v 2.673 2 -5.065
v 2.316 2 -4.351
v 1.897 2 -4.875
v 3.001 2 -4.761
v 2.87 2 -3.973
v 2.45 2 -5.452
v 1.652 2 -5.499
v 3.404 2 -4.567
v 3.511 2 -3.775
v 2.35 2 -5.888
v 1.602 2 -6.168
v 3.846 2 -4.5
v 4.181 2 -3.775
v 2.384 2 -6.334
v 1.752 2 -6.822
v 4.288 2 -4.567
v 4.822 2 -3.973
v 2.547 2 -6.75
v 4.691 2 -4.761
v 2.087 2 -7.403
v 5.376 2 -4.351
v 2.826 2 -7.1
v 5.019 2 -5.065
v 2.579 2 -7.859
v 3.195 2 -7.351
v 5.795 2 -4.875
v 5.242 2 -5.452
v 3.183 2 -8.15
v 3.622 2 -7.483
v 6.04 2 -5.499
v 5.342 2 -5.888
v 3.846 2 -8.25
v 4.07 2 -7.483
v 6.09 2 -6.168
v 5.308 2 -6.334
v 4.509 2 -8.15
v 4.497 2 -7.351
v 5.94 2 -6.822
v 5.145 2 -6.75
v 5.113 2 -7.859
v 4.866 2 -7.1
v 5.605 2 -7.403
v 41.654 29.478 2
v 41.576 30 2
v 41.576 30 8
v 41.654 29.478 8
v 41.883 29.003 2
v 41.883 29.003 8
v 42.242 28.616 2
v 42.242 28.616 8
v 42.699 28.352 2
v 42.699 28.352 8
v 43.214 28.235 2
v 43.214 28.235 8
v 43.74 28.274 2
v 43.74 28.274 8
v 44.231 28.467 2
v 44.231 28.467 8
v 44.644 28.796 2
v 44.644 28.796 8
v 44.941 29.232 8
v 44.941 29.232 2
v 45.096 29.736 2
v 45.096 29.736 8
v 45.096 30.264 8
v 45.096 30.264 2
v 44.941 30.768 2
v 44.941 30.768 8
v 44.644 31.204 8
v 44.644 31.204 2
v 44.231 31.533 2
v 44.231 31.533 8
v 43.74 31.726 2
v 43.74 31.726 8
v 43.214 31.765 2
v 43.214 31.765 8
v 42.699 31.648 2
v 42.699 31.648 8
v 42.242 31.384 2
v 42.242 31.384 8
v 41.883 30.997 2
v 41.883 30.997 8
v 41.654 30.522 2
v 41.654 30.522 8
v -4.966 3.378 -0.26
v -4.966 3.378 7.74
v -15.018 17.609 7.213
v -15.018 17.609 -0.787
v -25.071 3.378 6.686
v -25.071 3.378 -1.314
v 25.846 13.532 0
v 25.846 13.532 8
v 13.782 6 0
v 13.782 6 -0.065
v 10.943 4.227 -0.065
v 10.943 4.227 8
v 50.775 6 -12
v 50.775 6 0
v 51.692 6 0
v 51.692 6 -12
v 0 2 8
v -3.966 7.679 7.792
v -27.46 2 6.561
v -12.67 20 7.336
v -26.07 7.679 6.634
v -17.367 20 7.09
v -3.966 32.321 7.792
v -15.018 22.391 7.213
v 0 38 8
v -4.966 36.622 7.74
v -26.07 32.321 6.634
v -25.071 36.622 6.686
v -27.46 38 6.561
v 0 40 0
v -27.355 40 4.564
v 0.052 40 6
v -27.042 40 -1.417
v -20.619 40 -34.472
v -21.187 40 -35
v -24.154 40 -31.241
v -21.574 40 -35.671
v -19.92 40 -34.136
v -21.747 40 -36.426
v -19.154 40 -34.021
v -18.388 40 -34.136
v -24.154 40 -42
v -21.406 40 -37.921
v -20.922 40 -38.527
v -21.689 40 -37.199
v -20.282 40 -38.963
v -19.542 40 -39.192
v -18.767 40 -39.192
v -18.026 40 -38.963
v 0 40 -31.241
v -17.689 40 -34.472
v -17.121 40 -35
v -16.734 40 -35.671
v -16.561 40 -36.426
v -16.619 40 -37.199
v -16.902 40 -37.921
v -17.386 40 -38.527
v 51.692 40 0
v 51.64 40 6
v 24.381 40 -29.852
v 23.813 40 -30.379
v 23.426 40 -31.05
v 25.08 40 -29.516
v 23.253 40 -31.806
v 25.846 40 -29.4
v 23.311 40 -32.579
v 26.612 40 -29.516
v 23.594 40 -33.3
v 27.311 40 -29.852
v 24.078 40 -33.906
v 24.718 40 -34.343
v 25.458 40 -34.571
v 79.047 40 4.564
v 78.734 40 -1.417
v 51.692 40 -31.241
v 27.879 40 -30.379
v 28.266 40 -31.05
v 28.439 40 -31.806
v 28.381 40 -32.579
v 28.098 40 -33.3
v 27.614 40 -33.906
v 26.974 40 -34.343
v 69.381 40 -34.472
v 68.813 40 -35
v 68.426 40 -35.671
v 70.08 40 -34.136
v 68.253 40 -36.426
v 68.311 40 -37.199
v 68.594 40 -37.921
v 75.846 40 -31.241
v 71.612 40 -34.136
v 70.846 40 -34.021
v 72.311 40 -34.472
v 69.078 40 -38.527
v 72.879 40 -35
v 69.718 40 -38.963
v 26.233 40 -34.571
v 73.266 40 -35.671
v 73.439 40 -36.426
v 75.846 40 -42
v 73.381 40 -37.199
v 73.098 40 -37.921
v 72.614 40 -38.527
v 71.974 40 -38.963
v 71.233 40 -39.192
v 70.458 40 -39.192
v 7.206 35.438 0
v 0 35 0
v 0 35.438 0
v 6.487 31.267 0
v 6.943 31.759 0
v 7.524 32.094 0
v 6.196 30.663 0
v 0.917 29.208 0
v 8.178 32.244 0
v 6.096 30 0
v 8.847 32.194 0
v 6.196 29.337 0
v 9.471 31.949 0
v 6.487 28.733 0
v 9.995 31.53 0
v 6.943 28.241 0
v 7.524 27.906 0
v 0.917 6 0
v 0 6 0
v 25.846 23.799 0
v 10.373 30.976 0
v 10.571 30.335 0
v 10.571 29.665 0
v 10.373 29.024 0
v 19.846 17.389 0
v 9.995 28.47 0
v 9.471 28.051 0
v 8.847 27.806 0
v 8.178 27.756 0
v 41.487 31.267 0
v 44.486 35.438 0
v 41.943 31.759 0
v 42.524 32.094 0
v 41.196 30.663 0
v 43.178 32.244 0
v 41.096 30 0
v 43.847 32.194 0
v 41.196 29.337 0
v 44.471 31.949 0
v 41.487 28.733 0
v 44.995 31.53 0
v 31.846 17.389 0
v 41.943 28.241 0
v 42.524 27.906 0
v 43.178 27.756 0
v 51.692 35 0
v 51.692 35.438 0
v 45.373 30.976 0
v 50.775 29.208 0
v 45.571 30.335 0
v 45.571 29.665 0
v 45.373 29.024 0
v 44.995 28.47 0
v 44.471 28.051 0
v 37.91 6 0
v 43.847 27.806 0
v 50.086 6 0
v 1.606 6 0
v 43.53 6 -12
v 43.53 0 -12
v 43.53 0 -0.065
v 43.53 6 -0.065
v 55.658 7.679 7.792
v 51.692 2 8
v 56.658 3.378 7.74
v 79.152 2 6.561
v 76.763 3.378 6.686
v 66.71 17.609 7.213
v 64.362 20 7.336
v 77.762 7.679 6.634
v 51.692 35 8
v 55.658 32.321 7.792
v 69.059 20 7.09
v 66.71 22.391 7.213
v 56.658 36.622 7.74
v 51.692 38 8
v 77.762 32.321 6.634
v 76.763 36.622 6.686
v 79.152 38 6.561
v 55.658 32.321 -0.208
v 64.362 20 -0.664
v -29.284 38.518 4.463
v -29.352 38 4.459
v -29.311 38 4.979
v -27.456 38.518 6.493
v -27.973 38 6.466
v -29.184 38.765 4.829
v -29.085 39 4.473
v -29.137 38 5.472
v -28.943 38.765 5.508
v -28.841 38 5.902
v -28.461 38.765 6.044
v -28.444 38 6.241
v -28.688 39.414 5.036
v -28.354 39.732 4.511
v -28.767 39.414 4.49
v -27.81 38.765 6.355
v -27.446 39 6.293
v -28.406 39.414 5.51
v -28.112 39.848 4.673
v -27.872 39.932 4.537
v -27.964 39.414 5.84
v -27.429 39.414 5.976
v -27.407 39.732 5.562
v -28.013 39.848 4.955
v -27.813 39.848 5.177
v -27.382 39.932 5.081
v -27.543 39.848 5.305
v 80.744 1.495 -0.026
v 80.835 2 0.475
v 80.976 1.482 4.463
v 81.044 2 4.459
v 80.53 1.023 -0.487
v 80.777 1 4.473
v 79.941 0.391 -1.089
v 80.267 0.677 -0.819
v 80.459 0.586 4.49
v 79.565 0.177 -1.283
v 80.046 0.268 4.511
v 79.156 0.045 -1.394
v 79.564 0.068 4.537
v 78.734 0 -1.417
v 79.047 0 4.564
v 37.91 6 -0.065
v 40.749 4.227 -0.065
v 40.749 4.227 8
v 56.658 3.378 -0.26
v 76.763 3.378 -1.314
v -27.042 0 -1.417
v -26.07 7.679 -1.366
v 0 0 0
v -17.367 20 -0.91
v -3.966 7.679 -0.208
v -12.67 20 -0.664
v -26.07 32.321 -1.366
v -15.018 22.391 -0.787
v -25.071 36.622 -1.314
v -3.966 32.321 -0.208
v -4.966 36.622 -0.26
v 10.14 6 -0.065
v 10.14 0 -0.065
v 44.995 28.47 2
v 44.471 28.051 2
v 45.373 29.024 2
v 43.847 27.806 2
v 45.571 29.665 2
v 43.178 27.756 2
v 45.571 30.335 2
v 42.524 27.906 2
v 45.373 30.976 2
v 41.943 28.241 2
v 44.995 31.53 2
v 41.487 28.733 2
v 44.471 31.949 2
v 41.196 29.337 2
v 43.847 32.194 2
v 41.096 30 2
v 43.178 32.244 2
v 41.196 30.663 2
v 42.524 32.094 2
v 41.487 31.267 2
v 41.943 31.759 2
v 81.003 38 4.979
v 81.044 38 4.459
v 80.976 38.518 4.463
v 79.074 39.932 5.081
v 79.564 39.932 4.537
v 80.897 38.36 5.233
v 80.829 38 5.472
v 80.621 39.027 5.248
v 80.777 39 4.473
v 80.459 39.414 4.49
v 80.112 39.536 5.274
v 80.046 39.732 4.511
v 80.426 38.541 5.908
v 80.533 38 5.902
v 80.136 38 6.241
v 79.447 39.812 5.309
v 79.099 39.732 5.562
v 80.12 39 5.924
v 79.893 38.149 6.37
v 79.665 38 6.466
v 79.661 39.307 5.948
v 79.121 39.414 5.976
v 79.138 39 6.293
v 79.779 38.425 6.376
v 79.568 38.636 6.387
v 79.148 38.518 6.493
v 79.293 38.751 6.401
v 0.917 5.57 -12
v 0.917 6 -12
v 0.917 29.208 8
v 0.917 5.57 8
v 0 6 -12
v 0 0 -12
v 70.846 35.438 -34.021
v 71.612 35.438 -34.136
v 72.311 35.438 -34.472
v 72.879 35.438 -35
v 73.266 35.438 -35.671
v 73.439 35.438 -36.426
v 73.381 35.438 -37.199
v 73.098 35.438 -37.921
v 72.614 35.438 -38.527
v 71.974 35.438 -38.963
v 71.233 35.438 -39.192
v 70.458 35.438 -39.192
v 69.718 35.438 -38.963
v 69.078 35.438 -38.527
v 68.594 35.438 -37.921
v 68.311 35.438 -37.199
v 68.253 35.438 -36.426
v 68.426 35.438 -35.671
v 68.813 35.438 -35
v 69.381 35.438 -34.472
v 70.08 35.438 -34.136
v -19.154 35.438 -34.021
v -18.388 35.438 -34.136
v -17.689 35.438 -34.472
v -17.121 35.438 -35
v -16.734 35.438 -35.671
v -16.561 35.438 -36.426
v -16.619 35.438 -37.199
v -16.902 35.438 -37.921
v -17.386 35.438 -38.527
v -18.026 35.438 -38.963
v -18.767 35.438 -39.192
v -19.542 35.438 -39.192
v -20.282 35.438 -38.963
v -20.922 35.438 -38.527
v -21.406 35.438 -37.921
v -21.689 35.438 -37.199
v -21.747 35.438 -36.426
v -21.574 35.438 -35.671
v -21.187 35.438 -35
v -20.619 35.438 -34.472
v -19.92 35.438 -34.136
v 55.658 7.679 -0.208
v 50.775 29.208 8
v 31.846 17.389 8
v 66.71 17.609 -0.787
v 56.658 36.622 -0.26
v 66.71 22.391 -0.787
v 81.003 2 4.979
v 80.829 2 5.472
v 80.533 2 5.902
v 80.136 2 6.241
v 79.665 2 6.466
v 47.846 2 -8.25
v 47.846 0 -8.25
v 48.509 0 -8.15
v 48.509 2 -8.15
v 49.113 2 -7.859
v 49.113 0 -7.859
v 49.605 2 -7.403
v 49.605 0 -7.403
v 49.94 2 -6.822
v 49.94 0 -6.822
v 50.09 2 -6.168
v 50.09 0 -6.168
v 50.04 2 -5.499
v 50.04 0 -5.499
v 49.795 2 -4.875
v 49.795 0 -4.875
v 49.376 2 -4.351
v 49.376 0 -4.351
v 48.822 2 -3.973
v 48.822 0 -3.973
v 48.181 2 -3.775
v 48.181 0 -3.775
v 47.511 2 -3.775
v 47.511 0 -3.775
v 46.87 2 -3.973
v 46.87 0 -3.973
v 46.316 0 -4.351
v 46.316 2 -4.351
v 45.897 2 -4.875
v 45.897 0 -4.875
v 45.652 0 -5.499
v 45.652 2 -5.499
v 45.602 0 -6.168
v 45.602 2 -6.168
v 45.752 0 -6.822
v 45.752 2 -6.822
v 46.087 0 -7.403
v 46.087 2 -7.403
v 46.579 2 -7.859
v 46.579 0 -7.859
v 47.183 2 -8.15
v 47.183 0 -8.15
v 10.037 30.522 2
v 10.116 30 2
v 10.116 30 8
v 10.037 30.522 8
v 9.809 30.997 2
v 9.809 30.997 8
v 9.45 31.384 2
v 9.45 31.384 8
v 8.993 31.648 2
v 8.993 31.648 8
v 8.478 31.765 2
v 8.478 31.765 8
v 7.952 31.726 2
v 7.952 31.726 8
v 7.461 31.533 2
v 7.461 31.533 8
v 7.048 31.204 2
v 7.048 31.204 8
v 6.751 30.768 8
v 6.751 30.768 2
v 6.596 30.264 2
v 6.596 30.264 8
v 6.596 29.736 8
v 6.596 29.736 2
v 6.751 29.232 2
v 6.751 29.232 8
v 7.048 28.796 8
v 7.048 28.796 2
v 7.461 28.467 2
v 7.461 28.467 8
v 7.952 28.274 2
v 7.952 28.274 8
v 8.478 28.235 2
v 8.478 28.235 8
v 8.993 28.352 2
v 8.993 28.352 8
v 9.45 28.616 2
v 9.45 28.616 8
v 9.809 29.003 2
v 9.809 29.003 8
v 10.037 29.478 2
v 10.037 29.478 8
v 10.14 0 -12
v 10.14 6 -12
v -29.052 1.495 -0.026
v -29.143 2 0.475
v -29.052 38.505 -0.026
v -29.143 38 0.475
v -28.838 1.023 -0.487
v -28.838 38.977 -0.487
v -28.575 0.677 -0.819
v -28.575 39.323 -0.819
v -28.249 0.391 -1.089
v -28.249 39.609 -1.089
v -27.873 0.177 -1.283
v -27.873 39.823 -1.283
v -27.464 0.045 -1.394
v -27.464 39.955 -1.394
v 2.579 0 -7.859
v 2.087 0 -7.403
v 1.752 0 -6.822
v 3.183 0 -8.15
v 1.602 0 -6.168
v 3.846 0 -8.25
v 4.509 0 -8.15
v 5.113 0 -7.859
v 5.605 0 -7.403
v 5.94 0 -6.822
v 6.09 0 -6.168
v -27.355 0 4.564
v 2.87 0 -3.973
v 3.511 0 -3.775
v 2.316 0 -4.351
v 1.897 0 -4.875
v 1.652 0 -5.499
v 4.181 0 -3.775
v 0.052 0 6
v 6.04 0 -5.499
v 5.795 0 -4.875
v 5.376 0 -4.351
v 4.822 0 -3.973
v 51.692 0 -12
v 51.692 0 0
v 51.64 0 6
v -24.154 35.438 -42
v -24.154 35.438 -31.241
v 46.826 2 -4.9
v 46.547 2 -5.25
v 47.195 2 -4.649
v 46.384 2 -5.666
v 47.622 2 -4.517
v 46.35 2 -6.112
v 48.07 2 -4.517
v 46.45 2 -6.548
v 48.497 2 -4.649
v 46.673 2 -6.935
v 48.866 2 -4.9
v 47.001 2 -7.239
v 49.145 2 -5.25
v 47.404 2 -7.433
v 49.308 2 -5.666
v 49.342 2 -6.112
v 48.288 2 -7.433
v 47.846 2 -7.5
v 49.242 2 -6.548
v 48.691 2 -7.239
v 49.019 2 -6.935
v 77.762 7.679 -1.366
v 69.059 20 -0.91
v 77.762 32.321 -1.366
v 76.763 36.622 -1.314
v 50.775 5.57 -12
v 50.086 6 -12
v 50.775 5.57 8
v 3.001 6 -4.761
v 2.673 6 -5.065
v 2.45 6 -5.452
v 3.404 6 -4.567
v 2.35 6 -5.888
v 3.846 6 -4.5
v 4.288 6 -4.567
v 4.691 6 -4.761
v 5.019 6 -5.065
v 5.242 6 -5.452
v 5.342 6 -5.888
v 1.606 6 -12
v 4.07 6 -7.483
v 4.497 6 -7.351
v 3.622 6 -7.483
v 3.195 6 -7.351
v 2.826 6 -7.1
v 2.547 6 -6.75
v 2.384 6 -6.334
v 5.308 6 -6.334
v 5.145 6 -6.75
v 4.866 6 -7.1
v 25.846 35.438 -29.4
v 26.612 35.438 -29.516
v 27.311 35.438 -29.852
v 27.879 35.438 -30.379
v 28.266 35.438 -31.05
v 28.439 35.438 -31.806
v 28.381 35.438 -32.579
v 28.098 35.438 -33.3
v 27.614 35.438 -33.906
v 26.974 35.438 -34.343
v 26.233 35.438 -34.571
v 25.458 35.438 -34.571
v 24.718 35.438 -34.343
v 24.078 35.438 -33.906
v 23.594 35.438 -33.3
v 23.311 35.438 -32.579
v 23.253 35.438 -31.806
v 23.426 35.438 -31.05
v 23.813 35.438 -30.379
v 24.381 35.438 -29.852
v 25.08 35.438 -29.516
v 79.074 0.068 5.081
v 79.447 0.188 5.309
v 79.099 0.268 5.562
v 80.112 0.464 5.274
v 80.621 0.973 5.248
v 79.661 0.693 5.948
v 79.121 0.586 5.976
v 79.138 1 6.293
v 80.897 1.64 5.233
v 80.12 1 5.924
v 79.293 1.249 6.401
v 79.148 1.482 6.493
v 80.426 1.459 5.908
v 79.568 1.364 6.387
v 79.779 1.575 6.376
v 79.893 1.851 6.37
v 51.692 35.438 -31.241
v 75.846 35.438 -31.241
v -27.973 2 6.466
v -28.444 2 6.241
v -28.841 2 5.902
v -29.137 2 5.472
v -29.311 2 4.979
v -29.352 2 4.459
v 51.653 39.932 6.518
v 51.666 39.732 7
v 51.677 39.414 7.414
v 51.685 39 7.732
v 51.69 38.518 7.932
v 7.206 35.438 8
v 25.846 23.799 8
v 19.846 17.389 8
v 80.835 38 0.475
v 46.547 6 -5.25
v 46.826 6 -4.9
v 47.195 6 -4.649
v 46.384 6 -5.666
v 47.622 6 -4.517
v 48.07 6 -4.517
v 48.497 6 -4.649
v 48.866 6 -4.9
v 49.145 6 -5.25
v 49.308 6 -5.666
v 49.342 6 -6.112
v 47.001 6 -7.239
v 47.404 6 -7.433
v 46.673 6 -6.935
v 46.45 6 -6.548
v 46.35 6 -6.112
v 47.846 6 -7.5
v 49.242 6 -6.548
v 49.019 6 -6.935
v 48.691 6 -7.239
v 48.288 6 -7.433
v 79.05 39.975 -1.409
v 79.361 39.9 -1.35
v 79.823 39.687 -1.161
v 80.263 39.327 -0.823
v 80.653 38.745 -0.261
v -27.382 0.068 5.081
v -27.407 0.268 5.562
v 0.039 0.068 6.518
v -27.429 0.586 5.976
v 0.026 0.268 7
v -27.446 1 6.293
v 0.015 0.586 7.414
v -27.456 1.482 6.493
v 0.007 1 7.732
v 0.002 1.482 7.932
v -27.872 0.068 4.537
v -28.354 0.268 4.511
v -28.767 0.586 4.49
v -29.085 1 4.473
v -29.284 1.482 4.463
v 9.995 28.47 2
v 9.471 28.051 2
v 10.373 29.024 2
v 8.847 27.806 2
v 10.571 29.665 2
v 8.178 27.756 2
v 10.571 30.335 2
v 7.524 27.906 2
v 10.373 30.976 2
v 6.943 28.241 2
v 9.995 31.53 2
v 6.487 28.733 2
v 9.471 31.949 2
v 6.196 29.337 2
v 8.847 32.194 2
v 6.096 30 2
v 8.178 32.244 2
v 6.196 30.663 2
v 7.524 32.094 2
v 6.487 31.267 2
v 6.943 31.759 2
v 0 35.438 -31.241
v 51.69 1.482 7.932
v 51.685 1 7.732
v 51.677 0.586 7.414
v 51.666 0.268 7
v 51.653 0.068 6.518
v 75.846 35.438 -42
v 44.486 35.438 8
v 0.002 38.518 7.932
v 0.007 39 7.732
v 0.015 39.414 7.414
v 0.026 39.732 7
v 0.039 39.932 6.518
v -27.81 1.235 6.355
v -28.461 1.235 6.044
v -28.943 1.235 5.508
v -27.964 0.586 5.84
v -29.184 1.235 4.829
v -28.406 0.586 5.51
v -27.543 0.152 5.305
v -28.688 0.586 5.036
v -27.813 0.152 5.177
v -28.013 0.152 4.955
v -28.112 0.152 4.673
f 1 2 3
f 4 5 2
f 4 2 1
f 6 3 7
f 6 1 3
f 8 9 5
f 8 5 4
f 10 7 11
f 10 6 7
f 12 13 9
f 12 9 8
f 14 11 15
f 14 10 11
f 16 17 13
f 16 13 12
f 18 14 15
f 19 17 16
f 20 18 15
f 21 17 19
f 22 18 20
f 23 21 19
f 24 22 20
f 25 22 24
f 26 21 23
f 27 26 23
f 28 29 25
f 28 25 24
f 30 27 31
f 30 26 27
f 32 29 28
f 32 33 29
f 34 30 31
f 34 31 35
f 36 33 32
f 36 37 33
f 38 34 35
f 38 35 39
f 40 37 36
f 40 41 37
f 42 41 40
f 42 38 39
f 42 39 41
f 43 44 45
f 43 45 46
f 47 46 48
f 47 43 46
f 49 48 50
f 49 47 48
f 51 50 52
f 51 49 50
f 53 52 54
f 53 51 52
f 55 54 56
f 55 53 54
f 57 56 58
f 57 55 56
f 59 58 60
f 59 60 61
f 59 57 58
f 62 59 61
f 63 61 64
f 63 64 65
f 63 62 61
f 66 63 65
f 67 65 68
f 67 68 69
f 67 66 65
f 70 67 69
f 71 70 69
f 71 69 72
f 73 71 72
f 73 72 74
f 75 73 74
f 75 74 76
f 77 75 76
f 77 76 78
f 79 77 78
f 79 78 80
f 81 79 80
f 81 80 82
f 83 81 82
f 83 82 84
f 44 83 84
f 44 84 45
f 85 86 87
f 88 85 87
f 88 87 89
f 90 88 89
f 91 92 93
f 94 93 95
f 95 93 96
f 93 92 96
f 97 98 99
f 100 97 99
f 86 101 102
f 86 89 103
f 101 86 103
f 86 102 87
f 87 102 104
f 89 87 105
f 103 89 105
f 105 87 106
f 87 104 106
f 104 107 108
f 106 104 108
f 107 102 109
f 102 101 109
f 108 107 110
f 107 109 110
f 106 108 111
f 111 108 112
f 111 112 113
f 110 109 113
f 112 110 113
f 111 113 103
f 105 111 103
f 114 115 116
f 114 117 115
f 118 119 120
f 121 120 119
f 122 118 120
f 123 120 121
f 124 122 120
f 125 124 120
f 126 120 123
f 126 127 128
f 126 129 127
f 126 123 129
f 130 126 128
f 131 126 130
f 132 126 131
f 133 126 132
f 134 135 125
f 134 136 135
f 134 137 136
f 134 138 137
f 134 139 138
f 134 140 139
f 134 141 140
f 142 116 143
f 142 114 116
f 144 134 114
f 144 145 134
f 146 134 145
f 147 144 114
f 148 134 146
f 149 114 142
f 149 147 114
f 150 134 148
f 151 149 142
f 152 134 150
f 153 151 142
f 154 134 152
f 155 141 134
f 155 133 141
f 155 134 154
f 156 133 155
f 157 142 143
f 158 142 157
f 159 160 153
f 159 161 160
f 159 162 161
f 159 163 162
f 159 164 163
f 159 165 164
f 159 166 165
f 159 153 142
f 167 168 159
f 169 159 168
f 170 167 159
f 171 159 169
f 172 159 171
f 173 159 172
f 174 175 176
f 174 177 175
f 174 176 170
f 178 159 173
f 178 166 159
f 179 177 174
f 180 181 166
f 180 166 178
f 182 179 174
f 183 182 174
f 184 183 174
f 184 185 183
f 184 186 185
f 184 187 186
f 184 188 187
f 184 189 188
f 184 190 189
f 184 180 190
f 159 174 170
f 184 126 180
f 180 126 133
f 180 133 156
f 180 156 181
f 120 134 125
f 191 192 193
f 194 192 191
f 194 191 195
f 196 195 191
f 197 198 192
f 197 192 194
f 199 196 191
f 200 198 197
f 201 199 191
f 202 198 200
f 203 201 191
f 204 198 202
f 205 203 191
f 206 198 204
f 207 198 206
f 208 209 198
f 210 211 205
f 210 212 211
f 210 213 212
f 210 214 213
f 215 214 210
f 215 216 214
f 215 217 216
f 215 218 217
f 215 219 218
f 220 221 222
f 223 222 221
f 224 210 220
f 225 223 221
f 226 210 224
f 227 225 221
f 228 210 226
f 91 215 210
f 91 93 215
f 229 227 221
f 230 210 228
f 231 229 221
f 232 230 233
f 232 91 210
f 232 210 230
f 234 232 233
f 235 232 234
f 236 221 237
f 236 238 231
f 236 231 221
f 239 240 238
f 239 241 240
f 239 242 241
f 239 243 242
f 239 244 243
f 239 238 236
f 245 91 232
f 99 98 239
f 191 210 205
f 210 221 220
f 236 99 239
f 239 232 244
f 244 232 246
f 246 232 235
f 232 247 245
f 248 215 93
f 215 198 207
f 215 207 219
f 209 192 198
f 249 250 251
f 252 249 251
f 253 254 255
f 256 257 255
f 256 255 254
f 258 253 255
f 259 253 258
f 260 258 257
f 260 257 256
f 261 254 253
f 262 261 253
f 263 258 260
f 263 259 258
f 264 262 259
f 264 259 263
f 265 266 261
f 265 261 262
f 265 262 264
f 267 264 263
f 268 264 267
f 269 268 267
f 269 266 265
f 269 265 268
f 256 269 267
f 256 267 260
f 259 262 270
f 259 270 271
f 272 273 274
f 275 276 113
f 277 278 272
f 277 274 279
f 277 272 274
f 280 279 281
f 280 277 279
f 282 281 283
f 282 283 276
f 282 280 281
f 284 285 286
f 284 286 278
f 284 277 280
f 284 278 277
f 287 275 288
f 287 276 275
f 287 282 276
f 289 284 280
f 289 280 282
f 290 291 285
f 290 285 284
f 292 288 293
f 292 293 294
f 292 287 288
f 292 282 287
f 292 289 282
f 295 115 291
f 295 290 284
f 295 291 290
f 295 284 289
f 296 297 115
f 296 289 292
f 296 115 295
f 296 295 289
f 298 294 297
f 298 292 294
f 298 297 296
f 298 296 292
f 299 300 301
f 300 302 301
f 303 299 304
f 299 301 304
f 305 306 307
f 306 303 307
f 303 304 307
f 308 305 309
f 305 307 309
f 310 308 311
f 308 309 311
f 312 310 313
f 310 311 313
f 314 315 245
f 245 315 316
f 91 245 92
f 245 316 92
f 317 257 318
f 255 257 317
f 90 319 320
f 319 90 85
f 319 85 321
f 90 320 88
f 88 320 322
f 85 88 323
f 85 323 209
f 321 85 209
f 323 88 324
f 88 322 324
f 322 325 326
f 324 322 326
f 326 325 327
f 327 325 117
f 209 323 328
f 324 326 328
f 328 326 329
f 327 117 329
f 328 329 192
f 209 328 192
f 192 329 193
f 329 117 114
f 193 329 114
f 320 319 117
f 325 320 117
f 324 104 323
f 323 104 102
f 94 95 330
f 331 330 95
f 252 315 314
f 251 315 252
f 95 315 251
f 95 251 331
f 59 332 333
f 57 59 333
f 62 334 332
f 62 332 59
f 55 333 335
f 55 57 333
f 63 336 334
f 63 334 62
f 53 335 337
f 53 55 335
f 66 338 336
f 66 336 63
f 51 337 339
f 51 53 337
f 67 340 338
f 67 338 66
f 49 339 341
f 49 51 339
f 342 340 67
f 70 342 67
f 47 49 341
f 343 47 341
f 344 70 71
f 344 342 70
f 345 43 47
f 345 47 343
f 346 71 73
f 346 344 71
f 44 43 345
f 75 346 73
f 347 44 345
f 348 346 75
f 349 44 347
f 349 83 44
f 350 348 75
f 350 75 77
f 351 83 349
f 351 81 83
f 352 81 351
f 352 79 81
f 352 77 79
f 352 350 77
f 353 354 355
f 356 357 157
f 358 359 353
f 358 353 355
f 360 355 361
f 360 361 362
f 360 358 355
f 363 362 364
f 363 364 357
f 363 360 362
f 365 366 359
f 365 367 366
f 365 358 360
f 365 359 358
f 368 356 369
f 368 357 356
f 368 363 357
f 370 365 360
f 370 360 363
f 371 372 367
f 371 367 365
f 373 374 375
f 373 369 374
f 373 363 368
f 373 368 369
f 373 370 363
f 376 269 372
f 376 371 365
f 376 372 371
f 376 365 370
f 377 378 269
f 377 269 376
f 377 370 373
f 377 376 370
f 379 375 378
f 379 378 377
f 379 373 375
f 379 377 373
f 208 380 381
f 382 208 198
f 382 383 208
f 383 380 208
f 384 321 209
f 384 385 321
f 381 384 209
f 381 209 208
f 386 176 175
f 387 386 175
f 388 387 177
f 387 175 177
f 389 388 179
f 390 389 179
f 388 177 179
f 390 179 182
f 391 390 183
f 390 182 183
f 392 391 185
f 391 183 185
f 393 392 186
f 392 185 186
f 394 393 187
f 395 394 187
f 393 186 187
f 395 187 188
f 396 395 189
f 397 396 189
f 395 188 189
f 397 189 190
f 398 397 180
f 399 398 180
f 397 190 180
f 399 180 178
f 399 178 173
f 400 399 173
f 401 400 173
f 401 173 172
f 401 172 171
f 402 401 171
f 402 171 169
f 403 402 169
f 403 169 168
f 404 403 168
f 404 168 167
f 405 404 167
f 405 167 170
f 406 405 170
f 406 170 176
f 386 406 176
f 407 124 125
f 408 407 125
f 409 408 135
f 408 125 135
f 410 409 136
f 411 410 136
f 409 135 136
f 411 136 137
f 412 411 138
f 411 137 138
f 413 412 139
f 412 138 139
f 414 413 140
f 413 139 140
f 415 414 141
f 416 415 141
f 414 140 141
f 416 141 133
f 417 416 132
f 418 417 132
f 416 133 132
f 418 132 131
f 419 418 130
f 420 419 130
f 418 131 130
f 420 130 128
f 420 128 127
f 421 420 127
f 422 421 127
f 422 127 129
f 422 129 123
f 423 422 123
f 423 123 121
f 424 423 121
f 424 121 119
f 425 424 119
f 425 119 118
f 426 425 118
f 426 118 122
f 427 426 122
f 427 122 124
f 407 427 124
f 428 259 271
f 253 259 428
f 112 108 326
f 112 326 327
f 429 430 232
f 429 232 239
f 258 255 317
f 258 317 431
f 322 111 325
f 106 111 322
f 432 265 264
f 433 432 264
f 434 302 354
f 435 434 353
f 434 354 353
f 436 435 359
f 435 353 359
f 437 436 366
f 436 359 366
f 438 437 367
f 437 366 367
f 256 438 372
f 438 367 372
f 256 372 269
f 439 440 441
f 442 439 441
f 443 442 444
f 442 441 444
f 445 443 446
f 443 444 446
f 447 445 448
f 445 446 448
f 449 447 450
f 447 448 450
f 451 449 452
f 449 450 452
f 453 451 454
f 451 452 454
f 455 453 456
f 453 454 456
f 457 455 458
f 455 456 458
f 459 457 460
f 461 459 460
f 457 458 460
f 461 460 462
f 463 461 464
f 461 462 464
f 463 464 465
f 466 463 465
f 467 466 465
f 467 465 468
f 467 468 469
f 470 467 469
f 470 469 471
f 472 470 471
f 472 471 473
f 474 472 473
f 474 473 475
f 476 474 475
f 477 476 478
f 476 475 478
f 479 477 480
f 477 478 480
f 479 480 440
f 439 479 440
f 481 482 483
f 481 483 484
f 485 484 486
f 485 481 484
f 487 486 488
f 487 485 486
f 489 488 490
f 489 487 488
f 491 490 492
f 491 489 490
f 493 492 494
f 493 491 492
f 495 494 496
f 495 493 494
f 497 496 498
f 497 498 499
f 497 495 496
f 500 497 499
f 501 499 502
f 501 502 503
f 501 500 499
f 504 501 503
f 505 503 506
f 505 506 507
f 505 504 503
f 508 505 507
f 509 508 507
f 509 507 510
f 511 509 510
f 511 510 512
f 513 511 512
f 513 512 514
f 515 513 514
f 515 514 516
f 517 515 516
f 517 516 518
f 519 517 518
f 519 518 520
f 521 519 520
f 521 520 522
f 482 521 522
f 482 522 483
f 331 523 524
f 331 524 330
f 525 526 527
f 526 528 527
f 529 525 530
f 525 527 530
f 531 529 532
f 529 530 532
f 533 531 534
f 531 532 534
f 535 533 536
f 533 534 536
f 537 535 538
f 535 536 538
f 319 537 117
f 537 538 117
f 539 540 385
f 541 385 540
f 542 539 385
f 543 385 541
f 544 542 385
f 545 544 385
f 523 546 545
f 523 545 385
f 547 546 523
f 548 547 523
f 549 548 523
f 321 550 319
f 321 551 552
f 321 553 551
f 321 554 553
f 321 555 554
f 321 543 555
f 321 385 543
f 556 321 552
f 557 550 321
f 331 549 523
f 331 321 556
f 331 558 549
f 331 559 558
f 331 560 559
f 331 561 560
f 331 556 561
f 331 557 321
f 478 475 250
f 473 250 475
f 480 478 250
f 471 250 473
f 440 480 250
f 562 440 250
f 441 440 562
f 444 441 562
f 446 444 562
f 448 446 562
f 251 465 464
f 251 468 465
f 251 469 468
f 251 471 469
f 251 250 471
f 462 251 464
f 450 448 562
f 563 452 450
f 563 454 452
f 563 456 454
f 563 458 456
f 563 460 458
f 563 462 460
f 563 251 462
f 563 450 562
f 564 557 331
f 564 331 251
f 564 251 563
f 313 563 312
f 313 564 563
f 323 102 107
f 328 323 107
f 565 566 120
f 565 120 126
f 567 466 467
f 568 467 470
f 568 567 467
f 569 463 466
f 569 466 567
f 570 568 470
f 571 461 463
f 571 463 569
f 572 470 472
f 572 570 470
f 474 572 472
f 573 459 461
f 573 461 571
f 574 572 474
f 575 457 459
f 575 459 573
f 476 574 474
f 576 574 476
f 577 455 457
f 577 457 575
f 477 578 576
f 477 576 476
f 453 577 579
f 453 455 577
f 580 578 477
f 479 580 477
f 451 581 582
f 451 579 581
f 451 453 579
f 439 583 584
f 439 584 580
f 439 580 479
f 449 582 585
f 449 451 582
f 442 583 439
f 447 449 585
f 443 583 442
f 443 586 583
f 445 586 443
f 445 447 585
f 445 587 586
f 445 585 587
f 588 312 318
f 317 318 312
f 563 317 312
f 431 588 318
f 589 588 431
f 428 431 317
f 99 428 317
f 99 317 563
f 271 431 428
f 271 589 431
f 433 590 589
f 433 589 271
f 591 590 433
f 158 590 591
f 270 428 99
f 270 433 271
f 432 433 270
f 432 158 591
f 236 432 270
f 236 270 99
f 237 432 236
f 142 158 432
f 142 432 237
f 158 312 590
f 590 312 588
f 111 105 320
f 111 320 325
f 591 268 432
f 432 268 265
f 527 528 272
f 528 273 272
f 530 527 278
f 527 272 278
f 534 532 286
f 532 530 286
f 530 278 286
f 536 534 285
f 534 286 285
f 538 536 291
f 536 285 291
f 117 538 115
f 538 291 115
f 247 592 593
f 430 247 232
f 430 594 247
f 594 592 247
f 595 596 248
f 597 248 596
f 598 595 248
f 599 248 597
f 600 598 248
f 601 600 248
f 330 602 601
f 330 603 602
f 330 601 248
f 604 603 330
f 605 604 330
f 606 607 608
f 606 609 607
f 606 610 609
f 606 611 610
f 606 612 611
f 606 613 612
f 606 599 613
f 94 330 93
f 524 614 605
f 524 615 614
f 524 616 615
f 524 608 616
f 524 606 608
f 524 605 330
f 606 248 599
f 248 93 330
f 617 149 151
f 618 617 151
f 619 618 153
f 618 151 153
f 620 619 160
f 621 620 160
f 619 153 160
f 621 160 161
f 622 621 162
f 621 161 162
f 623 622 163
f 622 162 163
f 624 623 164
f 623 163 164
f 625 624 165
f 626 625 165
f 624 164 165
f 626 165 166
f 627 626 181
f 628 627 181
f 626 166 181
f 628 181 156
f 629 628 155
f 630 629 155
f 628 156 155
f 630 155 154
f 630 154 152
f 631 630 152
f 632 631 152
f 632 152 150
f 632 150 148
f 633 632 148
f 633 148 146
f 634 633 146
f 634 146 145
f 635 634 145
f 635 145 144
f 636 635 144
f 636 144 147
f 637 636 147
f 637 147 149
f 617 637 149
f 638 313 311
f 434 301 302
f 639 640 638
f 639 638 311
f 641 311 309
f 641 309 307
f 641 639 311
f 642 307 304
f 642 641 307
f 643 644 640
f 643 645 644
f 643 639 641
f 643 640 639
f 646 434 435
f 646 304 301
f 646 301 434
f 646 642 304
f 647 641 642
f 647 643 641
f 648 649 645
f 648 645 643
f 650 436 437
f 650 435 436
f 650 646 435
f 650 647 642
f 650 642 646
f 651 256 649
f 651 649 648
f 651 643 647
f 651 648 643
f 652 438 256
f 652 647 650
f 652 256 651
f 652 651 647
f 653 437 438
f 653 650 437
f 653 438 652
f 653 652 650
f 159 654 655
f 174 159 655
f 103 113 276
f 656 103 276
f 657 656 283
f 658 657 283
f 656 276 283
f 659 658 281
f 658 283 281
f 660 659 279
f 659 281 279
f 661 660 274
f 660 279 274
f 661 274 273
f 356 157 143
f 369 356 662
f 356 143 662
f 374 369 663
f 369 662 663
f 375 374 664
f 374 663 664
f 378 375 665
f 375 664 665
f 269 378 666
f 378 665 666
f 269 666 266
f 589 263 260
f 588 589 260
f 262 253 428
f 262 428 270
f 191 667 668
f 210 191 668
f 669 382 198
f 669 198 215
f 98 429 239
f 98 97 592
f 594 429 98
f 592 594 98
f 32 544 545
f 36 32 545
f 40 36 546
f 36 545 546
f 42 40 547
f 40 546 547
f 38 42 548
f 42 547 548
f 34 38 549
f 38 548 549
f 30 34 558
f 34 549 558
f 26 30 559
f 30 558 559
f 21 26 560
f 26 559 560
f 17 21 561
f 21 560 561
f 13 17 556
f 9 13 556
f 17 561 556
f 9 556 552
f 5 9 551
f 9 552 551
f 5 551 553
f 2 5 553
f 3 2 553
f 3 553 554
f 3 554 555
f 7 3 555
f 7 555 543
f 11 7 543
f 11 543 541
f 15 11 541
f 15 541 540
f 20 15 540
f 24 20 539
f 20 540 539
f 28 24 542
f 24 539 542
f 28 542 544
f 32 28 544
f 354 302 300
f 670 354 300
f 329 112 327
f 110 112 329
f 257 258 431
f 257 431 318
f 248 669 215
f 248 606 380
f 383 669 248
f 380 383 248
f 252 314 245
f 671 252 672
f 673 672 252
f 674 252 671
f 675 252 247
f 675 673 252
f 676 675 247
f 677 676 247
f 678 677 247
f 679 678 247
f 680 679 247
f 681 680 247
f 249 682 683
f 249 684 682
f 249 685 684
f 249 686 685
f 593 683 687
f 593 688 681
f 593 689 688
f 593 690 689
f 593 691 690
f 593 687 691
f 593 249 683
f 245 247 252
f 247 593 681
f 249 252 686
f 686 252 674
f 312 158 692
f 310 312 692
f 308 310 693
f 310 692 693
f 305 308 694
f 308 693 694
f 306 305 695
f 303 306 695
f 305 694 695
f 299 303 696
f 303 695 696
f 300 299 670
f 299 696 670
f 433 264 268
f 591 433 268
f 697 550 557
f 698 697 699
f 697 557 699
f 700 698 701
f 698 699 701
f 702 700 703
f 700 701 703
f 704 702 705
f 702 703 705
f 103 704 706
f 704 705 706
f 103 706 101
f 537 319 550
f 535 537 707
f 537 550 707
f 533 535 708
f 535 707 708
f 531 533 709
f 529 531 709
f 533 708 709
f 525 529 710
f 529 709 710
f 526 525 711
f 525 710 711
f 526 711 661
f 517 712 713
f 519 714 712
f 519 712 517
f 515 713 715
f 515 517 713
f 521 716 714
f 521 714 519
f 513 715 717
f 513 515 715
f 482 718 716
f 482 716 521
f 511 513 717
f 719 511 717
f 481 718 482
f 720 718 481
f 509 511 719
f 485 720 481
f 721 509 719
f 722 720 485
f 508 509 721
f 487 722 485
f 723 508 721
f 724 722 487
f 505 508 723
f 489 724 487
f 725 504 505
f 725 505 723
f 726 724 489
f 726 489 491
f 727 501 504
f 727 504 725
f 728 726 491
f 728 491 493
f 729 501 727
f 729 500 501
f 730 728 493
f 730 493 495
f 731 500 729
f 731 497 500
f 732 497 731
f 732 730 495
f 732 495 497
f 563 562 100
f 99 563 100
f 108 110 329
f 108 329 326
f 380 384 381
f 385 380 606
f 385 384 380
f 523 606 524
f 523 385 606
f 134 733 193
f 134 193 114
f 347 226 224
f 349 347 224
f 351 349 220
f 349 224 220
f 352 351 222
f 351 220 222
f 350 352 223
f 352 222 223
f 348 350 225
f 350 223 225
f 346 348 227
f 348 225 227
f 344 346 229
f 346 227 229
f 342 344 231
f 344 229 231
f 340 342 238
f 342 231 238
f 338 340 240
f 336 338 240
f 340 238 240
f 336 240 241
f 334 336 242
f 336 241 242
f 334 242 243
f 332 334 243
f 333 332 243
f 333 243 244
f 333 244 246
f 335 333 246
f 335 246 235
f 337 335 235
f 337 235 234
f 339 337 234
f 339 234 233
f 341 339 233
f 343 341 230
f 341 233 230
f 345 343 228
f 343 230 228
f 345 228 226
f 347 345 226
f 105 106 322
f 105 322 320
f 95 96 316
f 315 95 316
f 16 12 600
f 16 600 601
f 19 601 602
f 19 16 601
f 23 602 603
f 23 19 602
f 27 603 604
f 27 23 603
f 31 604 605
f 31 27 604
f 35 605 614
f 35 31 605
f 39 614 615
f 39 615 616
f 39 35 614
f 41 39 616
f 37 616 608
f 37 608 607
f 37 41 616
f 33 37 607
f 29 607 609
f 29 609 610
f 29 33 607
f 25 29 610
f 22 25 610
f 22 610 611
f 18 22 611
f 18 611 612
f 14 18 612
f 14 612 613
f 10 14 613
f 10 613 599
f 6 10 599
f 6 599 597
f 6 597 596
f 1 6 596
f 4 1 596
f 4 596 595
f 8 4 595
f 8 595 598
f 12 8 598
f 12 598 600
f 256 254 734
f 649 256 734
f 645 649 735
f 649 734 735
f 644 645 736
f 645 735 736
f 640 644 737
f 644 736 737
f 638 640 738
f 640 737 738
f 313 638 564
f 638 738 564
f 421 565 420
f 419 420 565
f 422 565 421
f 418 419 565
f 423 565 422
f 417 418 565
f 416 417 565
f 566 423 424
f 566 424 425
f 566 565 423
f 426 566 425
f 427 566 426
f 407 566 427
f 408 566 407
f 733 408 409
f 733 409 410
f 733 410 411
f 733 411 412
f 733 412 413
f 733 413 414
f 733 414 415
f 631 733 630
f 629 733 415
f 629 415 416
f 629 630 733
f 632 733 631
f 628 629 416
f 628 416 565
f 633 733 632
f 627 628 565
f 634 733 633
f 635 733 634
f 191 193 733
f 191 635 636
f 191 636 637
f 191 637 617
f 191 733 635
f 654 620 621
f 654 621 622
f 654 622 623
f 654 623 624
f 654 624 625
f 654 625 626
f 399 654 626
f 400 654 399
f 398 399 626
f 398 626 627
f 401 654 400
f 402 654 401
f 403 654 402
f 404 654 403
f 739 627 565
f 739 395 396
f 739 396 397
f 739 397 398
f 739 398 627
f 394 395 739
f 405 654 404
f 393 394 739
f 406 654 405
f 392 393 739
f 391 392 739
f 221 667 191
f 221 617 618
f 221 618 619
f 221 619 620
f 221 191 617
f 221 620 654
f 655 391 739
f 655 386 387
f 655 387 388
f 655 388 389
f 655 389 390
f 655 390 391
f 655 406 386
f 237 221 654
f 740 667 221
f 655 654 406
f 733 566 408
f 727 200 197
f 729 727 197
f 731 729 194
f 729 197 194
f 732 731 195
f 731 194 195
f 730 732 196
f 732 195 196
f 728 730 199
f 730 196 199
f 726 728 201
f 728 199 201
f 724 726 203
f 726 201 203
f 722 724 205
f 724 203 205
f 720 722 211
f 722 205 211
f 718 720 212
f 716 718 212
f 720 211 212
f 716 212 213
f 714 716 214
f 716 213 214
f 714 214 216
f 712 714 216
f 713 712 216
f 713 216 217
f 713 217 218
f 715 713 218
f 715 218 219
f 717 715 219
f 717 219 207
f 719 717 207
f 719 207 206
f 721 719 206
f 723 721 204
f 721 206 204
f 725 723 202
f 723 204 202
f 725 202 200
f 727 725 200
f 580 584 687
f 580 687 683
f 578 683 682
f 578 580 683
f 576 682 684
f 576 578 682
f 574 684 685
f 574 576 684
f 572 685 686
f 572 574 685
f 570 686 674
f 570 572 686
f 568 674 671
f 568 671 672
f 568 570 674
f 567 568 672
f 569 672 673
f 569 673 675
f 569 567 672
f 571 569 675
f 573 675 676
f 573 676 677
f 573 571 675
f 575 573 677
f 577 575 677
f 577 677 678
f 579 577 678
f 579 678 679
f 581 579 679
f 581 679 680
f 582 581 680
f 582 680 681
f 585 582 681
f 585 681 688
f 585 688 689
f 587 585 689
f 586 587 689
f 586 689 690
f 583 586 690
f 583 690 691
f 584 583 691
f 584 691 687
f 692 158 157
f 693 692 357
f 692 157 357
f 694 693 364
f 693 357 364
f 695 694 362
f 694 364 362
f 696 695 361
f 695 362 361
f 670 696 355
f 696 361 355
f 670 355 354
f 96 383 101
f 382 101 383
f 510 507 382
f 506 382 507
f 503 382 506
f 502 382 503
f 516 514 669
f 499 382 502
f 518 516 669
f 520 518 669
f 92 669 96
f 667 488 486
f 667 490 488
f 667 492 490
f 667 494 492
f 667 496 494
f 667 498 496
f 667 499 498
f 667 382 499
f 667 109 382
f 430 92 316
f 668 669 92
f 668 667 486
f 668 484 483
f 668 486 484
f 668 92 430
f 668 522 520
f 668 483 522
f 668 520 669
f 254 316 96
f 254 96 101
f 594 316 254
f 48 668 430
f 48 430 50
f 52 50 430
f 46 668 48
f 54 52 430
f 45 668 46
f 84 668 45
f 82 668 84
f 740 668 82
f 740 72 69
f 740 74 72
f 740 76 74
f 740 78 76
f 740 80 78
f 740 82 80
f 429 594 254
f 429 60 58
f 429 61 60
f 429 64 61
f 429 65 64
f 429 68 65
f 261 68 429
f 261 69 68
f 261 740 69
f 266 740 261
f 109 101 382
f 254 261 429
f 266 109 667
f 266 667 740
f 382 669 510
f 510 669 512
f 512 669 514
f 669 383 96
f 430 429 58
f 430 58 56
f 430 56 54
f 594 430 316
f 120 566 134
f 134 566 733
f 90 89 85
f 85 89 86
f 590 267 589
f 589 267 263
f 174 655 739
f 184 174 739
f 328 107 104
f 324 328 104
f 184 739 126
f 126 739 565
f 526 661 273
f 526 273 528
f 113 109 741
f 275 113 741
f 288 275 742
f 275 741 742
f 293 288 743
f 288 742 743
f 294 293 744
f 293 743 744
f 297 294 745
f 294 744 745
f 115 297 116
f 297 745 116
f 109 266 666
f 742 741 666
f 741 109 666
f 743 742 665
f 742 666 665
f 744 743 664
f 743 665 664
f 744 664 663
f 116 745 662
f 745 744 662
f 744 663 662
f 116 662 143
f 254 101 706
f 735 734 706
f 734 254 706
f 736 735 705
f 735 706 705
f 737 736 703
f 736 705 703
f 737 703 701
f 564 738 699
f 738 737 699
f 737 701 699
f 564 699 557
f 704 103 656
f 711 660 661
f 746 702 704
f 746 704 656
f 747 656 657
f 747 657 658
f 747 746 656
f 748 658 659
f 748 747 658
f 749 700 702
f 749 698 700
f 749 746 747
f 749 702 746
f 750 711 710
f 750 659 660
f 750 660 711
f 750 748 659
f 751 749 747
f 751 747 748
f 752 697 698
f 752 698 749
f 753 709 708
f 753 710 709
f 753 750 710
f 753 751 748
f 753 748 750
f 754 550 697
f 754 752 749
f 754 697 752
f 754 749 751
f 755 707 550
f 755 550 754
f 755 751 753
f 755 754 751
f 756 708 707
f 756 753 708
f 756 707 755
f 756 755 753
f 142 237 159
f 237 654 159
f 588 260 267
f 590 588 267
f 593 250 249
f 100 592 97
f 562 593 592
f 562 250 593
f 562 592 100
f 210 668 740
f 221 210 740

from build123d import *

# Parameters (mm, degrees)
SKETCH1_W                = 51.691952551
SKETCH1_H                = 12
SKETCH1_R                = 1.5
BOSS_EXTRUDE1_DEPTH      = 6
SKETCH2_W                = 51.691952551
SKETCH2_H                = 35
SKETCH2_R                = 1.770138793
BOSS_EXTRUDE2_DEPTH      = 8
SKETCH3_R                = 2.25
CUT_EXTRUDE1_DEPTH       = 2
SKETCH4_R                = 2.25
CUT_EXTRUDE2_DEPTH       = 2
BOSS_EXTRUDE3_DEPTH      = 5
BOSS_EXTRUDE3_DEPTH_BACK = 0.0001
SKETCH5_W                = 24.154023724
SKETCH5_H                = 10.75880516
SKETCH5_W_2              = 24.154023725
CUT_EXTRUDE5_DEPTH       = 54
SKETCH15_W               = 33.389515724
SKETCH15_H               = 11.934964058
SKETCH15_W_2             = 15.051094337
SKETCH15_H_2             = 8.223566484
CUT_EXTRUDE6_DEPTH       = 31
BOSS_EXTRUDE6_REACH      = 97.481
CUT_EXTRUDE8_DEPTH       = 31
FILLET1_R                = 2
SKETCH23_R               = 2.6
CUT_EXTRUDE9_DEPTH       = 31
SKETCH25_W               = 109.4362768
SKETCH25_H               = 39.504770738
SKETCH25_W_2             = 51.691952551
SKETCH25_H_2             = 2.495229262
CUT_EXTRUDE10_DEPTH      = 0.437959608


with BuildPart() as part:
    # Sketch1 → Boss-Extrude1 (new body)
    with BuildSketch(Plane(origin=(0, 0, 0), x_dir=(1, 0, 0), z_dir=(0, 1, 0))):
        with Locations((25.845976275, 6)):
            Rectangle(SKETCH1_W, SKETCH1_H)
        with Locations(Location((3.845976276, 6, 0), (0, 0, 270))):
            Circle(SKETCH1_R, mode=Mode.SUBTRACT)
        with Locations(Location((47.845976276, 6, 0), (0, 0, 90))):
            Circle(SKETCH1_R, mode=Mode.SUBTRACT)
    extrude(amount=BOSS_EXTRUDE1_DEPTH)

    # Sketch2 → Boss-Extrude2 (add)
    with BuildSketch(Plane.XY):
        with Locations((25.845976275, 17.5)):
            Rectangle(SKETCH2_W, SKETCH2_H)
        with Locations((8.345976276, 30)):
            Circle(SKETCH2_R, mode=Mode.SUBTRACT)
        with Locations(Location((43.345976276, 30, 0), (0, 0, 180))):
            Circle(SKETCH2_R, mode=Mode.SUBTRACT)
    extrude(amount=BOSS_EXTRUDE2_DEPTH)

    # Sketch3 → Cut-Extrude1 (cut)
    with BuildSketch(Plane.XZ):
        with Locations(Location((47.845976276, -6, 0), (0, 0, 270))):
            Circle(SKETCH3_R)
        with Locations(Location((3.845976276, -6, 0), (0, 0, 270))):
            Circle(SKETCH3_R)
    extrude(amount=-CUT_EXTRUDE1_DEPTH, mode=Mode.SUBTRACT)

    # Sketch4 → Cut-Extrude2 (cut)
    with BuildSketch(Plane(origin=(0, 0, 0), x_dir=(-1, 0, 0), z_dir=(0, 0, -1))):
        with Locations((-43.345976276, 30)):
            Circle(SKETCH4_R)
        with Locations((-8.345976276, 30)):
            Circle(SKETCH4_R)
    extrude(amount=-CUT_EXTRUDE2_DEPTH, mode=Mode.SUBTRACT)

    # Sketch5 → Boss-Extrude3 (add, two sides: drawn at the far end of the back side and taken through both)
    # profile 1 of 3: a face of its own
    with BuildSketch(Plane(origin=(0, 35, 0), x_dir=(1, 0, 0), z_dir=(0, 1, 0)).offset(-BOSS_EXTRUDE3_DEPTH_BACK)):
        Polygon((0, -8), (25.845976276, -8), (51.691952551, -8), (51.691952551, 31.24119484), (51.691952551, 42), (0, 42), (0, 31.24119484), align=None)
        with BuildLine():
            ThreePointArc((28.345976276, 32), (27.613743229, 30.232233047), (25.845976276, 29.5))
            ThreePointArc((25.845976276, 29.5), (24.078209323, 33.767766953), (28.345976276, 32))
        make_face(mode=Mode.SUBTRACT)
    # profile 2 of 3: a face of its own
    with BuildSketch(Plane(origin=(0, 35, 0), x_dir=(1, 0, 0), z_dir=(0, 1, 0)).offset(-BOSS_EXTRUDE3_DEPTH_BACK)):
        with Locations((-12.077011862, 36.62059742)):
            Rectangle(SKETCH5_W, SKETCH5_H)
    # profile 3 of 3: a face of its own
    with BuildSketch(Plane(origin=(0, 35, 0), x_dir=(1, 0, 0), z_dir=(0, 1, 0)).offset(-BOSS_EXTRUDE3_DEPTH_BACK)):
        with Locations((63.768964414, 36.62059742)):
            Rectangle(SKETCH5_W_2, SKETCH5_H)
    extrude(amount=BOSS_EXTRUDE3_DEPTH + BOSS_EXTRUDE3_DEPTH_BACK)

    # Sketch14 → Cut-Extrude5 (cut)
    with BuildSketch(Plane.XY.offset(8)):
        Polygon((50.775139706, 29.207985595), (50.775139706, 5.569526874), (31.845976276, 17.388756234), align=None)
        Polygon((19.845976276, 17.388756234), (0.916812846, 5.569526874), (0.916812846, 29.207985595), align=None)
        Polygon((25.845976276, 23.799215747), (44.485921829, 35.437859608), (7.206030723, 35.437859608), align=None)
        Polygon((25.845976276, 13.532490719), (10.943267581, 4.227349855), (40.74868497, 4.227349855), align=None)
    extrude(amount=-CUT_EXTRUDE5_DEPTH, mode=Mode.SUBTRACT)

    # Sketch15 → Cut-Extrude6 (cut)
    with BuildSketch(Plane.XZ):
        with Locations((26.834743107, -6.032517971)):
            Rectangle(SKETCH15_W, SKETCH15_H)
        with Locations((26.283455375, -16.111783242)):
            Rectangle(SKETCH15_W_2, SKETCH15_H_2)
    extrude(amount=-CUT_EXTRUDE6_DEPTH, mode=Mode.SUBTRACT)

    # Boss-Extrude6: up to this face of the body (flat: up to its plane)
    boss_extrude6_end = Plane(part.part.faces().sort_by_distance((25.193104525, 0, 0.873444785))[0])
    # Sketch20 → Boss-Extrude6 (add, up to the picked face)
    with BuildSketch(Plane(origin=(0, 40, 0), x_dir=(1, 0, 0), z_dir=(0, 1, 0)), mode=Mode.PRIVATE) as boss_extrude6_sk1:
        Polygon((0, -8), (-29.456928706, -6.456227782), (-29.038814853, 1.521859799), (0, 0), align=None)
    boss_extrude6_tool1 = split(extrude(boss_extrude6_sk1.sketch, amount=-BOSS_EXTRUDE6_REACH, mode=Mode.PRIVATE), bisect_by=boss_extrude6_end, keep=Keep.BOTH, mode=Mode.PRIVATE)
    # Sketch20 → Boss-Extrude6 (add, up to the picked face)
    with BuildSketch(Plane(origin=(0, 40, 0), x_dir=(1, 0, 0), z_dir=(0, 1, 0)), mode=Mode.PRIVATE) as boss_extrude6_sk2:
        Polygon((51.691952551, 0), (51.691952551, -8), (81.148881258, -6.456227782), (80.730767404, 1.521859799), align=None)
    boss_extrude6_tool2 = split(extrude(boss_extrude6_sk2.sketch, amount=-BOSS_EXTRUDE6_REACH, mode=Mode.PRIVATE), bisect_by=boss_extrude6_end, keep=Keep.BOTH, mode=Mode.PRIVATE)
    add(boss_extrude6_tool1.solids().sort_by(Axis((-14.624185, 40, 3.243109), (0, -1, 0)))[0])
    add(boss_extrude6_tool2.solids().sort_by(Axis((66.316137, 40, 3.243109), (0, -1, 0)))[0])

    # Sketch21 → Cut-Extrude8 (cut)
    with BuildSketch(Plane.XY.offset(8)):
        Polygon((-3.96613305, 7.67862469), (-3.96613305, 32.32137531), (-12.669640792, 20), align=None)
        Polygon((-4.965773008, 36.621958218), (-15.018260668, 22.39086003), (-25.070748328, 36.621958218), align=None)
        Polygon((-15.018260668, 17.60913997), (-25.070748328, 3.378041782), (-4.965773008, 3.378041782), align=None)
        Polygon((-26.070388286, 32.32137531), (-17.366880544, 20), (-26.070388286, 7.67862469), align=None)
        Polygon((69.058833096, 20), (77.762340838, 7.67862469), (77.762340838, 32.32137531), align=None)
        Polygon((76.762700879, 3.378041782), (56.657725559, 3.378041782), (66.710213219, 17.60913997), align=None)
        Polygon((76.762700879, 36.621958218), (56.657725559, 36.621958218), (66.710213219, 22.39086003), align=None)
        Polygon((64.361593343, 20), (55.658085601, 7.67862469), (55.658085601, 32.32137531), align=None)
    extrude(amount=-CUT_EXTRUDE8_DEPTH, mode=Mode.SUBTRACT)

    # Fillet1
    # the kernel refuses this fillet: 2 mm, written as the material it takes off along each edge
    with BuildSketch(Plane(origin=(-27.354997724, 38, 4.563640625), x_dir=(-0.9986295347545743, 0, -0.05233595624293728), z_dir=(0, 1, 0))) as fillet1_piece_1_section:
        Polygon((0, 0), (FILLET1_R, 0), (FILLET1_R, FILLET1_R), (0, FILLET1_R), align=None)
    fillet1_piece_1 = extrude(amount=FILLET1_R, mode=Mode.PRIVATE)
    fillet1_piece_1 = fillet1_piece_1 - Plane(origin=(-27.354997724, 38, 4.563640625), x_dir=(0.7431448254773897, 0, -0.6691306063588632), z_dir=(0, 1, 0)) * Sphere(FILLET1_R, mode=Mode.PRIVATE)
    add(fillet1_piece_1, mode=Mode.SUBTRACT)
    with BuildSketch(Plane(origin=(-27.354997724, 2, 4.563640625), x_dir=(-0.9986295347545743, 0, -0.05233595624293728), z_dir=(0, -1, 0))) as fillet1_piece_2_section:
        Polygon((0, 0), (FILLET1_R, 0), (FILLET1_R, -FILLET1_R), (0, -FILLET1_R), align=None)
    fillet1_piece_2 = extrude(amount=FILLET1_R, mode=Mode.PRIVATE)
    fillet1_piece_2 = fillet1_piece_2 - Plane(origin=(-27.354997724, 2, 4.563640625), x_dir=(0.7431448254773897, 0, -0.6691306063588632), z_dir=(0, -1, 0)) * Sphere(FILLET1_R, mode=Mode.PRIVATE)
    add(fillet1_piece_2, mode=Mode.SUBTRACT)
    with BuildSketch(Plane(origin=(79.046950276, 38, 4.563640625), x_dir=(0, 1, 0), z_dir=(0.052335956242936896, 0, 0.9986295347545743))) as fillet1_piece_3_section:
        Polygon((0, 0), (FILLET1_R, 0), (FILLET1_R, -FILLET1_R), (0, -FILLET1_R), align=None)
    fillet1_piece_3 = extrude(amount=FILLET1_R, mode=Mode.PRIVATE)
    fillet1_piece_3 = fillet1_piece_3 - Plane(origin=(79.046950276, 38, 4.563640625), x_dir=(-0.7061377159181265, -0.7071067811865475, 0.03700710955926369), z_dir=(0.052335956242936896, 0, 0.9986295347545743)) * Sphere(FILLET1_R, mode=Mode.PRIVATE)
    add(fillet1_piece_3, mode=Mode.SUBTRACT)
    with BuildSketch(Plane(origin=(79.046950276, 2, 4.563640625), x_dir=(0.9986295347545743, 0, -0.05233595624293772), z_dir=(0.052335956242936896, 0, 0.9986295347545743))) as fillet1_piece_4_section:
        Polygon((0, 0), (FILLET1_R, 0), (FILLET1_R, -FILLET1_R), (0, -FILLET1_R), align=None)
    fillet1_piece_4 = extrude(amount=FILLET1_R, mode=Mode.PRIVATE)
    fillet1_piece_4 = fillet1_piece_4 - Plane(origin=(79.046950276, 2, 4.563640625), x_dir=(-0.7061377159181265, 0.7071067811865475, 0.03700710955926369), z_dir=(0.052335956242936896, 0, 0.9986295347545743)) * Sphere(FILLET1_R, mode=Mode.PRIVATE)
    add(fillet1_piece_4, mode=Mode.SUBTRACT)
    with BuildSketch(Plane(origin=(-29.352256794, 40, 4.458968713), x_dir=(0.9986295347545742, 0, 0.052335956242937264), z_dir=(0.05233595624293728, 0, -0.9986295347545743)), Plane(origin=(81.044209345, 0, 4.458968713), x_dir=(-0.9986295347545742, 1.7763568394002568e-15, 0.052335956242937715), z_dir=(-0.05233595624293772, 0, -0.9986295347545743))) as fillet1_piece_5:
        with BuildLine():
            CenterArc((FILLET1_R, FILLET1_R), FILLET1_R, 180, 90)
            Line((0, FILLET1_R), (0, 0))
            Line((0, 0), (FILLET1_R, 0))
        make_face()
    extrude(amount=10.989036278, mode=Mode.SUBTRACT)
    with BuildSketch(Plane(origin=(4.993147674, 40, 8.261679781), x_dir=(0.05233595624293691, 0, -0.9986295347545743), z_dir=(-0.9986295347545743, 0, -0.05233595624293691)), Plane(origin=(46.698804878, 0, 8.261679781), x_dir=(-0.052335956242936896, 0, -0.9986295347545743), z_dir=(0.9986295347545743, 0, -0.052335956242936896))) as fillet1_piece_6:
        with BuildLine():
            CenterArc((FILLET1_R, FILLET1_R), FILLET1_R, 180, 90)
            Line((0, FILLET1_R), (0, 0))
            Line((0, 0), (FILLET1_R, 0))
        make_face()
    extrude(amount=32.497353804, mode=Mode.SUBTRACT)
    with BuildSketch(Plane(origin=(-29.038814853, 45, -1.521859799), x_dir=(0.9986295347545744, 0, 0.05233595624293688), z_dir=(0, -1, 0))) as fillet1_piece_7:
        with BuildLine():
            CenterArc((FILLET1_R, FILLET1_R), FILLET1_R, 180, 90)
            Line((0, FILLET1_R), (0, 0))
            Line((0, 0), (FILLET1_R, 0))
        make_face()
    extrude(amount=50, mode=Mode.SUBTRACT)
    with BuildSketch(Plane(origin=(-29.352256794, 0, 4.458968713), x_dir=(0.9986295347545744, 0, 0.05233595624293728), z_dir=(0.05233595624293728, 0, -0.9986295347545743)), Plane(origin=(81.044209345, 40, 4.458968713), x_dir=(-0.9986295347545742, 0, 0.052335956242937715), z_dir=(-0.05233595624293772, 0, -0.9986295347545743))) as fillet1_piece_8:
        with BuildLine():
            CenterArc((FILLET1_R, -FILLET1_R), FILLET1_R, 90, 90)
            Line((0, -FILLET1_R), (0, 0))
            Line((0, 0), (FILLET1_R, 0))
        make_face()
    extrude(amount=10.989036278, mode=Mode.SUBTRACT)
    with BuildSketch(Plane(origin=(-29.456928706, 38, 6.456227782), x_dir=(0.0523359562429366, 0, -0.9986295347545744), z_dir=(0, -1, 0))) as fillet1_piece_9:
        with BuildLine():
            CenterArc((FILLET1_R, FILLET1_R), FILLET1_R, 180, 90)
            Line((0, FILLET1_R), (0, 0))
            Line((0, 0), (FILLET1_R, 0))
        make_face()
    extrude(amount=36, mode=Mode.SUBTRACT)
    with BuildSketch(Plane(origin=(4.993147674, 0, 8.261679781), x_dir=(0.05233595624293691, 0, -0.9986295347545743), z_dir=(-0.9986295347545743, 0, -0.05233595624293691)), Plane(origin=(46.698804878, 40, 8.261679781), x_dir=(-0.052335956242936896, 0, -0.9986295347545743), z_dir=(0.9986295347545743, 0, -0.052335956242936896))) as fillet1_piece_10:
        with BuildLine():
            CenterArc((FILLET1_R, -FILLET1_R), FILLET1_R, 90, 90)
            Line((0, -FILLET1_R), (0, 0))
            Line((0, 0), (FILLET1_R, 0))
        make_face()
    extrude(amount=32.497353804, mode=Mode.SUBTRACT)
    with BuildSketch(Plane(origin=(-5, 0, 8), x_dir=(0, 0, -1), z_dir=(1, 0, 0)), Plane(origin=(56.691952551, 40, 8), x_dir=(0, 0, -1), z_dir=(-1, 0, 0))) as fillet1_piece_11:
        with BuildLine():
            CenterArc((FILLET1_R, FILLET1_R), FILLET1_R, 180, 90)
            Line((0, FILLET1_R), (0, 0))
            Line((0, 0), (FILLET1_R, 0))
        make_face()
    extrude(amount=61.691952551, mode=Mode.SUBTRACT)
    with BuildSketch(Plane(origin=(81.148881258, 38, 6.456227782), x_dir=(-0.05233595624293482, 0, -0.9986295347545744), z_dir=(0, -1, 0))) as fillet1_piece_12:
        with BuildLine():
            CenterArc((FILLET1_R, -FILLET1_R), FILLET1_R, 90, 90)
            Line((0, -FILLET1_R), (0, 0))
            Line((0, 0), (FILLET1_R, 0))
        make_face()
    extrude(amount=36, mode=Mode.SUBTRACT)
    with BuildSketch(Plane(origin=(80.730767404, 45, -1.521859799), x_dir=(-0.9986295347545743, 0, 0.052335956242936604), z_dir=(0, -1, 0))) as fillet1_piece_13:
        with BuildLine():
            CenterArc((FILLET1_R, -FILLET1_R), FILLET1_R, 90, 90)
            Line((0, -FILLET1_R), (0, 0))
            Line((0, 0), (FILLET1_R, 0))
        make_face()
    extrude(amount=50, mode=Mode.SUBTRACT)

    # Sketch23 → Cut-Extrude9 (cut)
    with BuildSketch(Plane(origin=(0, 40, 0), x_dir=(1, 0, 0), z_dir=(0, 1, 0))):
        with Locations(Location((-19.154023724, 36.62059742, 0), (0, 0, 270))):
            Circle(SKETCH23_R)
        with Locations(Location((25.845976276, 32, 0), (0, 0, 270))):
            Circle(SKETCH23_R)
        with Locations(Location((70.845976276, 36.62059742, 0), (0, 0, 270))):
            Circle(SKETCH23_R)
    extrude(amount=-CUT_EXTRUDE9_DEPTH, mode=Mode.SUBTRACT)

    # Sketch25 → Cut-Extrude10 (cut)
    with BuildSketch(Plane.XZ.offset(-34.9999)):
        with Locations((30.564114676, -22.247614631)):
            Rectangle(SKETCH25_W, SKETCH25_H)
        with Locations((25.845976275, -1.247614631)):
            Rectangle(SKETCH25_W_2, SKETCH25_H_2)
    extrude(amount=-CUT_EXTRUDE10_DEPTH, mode=Mode.SUBTRACT)


solid = part.part
